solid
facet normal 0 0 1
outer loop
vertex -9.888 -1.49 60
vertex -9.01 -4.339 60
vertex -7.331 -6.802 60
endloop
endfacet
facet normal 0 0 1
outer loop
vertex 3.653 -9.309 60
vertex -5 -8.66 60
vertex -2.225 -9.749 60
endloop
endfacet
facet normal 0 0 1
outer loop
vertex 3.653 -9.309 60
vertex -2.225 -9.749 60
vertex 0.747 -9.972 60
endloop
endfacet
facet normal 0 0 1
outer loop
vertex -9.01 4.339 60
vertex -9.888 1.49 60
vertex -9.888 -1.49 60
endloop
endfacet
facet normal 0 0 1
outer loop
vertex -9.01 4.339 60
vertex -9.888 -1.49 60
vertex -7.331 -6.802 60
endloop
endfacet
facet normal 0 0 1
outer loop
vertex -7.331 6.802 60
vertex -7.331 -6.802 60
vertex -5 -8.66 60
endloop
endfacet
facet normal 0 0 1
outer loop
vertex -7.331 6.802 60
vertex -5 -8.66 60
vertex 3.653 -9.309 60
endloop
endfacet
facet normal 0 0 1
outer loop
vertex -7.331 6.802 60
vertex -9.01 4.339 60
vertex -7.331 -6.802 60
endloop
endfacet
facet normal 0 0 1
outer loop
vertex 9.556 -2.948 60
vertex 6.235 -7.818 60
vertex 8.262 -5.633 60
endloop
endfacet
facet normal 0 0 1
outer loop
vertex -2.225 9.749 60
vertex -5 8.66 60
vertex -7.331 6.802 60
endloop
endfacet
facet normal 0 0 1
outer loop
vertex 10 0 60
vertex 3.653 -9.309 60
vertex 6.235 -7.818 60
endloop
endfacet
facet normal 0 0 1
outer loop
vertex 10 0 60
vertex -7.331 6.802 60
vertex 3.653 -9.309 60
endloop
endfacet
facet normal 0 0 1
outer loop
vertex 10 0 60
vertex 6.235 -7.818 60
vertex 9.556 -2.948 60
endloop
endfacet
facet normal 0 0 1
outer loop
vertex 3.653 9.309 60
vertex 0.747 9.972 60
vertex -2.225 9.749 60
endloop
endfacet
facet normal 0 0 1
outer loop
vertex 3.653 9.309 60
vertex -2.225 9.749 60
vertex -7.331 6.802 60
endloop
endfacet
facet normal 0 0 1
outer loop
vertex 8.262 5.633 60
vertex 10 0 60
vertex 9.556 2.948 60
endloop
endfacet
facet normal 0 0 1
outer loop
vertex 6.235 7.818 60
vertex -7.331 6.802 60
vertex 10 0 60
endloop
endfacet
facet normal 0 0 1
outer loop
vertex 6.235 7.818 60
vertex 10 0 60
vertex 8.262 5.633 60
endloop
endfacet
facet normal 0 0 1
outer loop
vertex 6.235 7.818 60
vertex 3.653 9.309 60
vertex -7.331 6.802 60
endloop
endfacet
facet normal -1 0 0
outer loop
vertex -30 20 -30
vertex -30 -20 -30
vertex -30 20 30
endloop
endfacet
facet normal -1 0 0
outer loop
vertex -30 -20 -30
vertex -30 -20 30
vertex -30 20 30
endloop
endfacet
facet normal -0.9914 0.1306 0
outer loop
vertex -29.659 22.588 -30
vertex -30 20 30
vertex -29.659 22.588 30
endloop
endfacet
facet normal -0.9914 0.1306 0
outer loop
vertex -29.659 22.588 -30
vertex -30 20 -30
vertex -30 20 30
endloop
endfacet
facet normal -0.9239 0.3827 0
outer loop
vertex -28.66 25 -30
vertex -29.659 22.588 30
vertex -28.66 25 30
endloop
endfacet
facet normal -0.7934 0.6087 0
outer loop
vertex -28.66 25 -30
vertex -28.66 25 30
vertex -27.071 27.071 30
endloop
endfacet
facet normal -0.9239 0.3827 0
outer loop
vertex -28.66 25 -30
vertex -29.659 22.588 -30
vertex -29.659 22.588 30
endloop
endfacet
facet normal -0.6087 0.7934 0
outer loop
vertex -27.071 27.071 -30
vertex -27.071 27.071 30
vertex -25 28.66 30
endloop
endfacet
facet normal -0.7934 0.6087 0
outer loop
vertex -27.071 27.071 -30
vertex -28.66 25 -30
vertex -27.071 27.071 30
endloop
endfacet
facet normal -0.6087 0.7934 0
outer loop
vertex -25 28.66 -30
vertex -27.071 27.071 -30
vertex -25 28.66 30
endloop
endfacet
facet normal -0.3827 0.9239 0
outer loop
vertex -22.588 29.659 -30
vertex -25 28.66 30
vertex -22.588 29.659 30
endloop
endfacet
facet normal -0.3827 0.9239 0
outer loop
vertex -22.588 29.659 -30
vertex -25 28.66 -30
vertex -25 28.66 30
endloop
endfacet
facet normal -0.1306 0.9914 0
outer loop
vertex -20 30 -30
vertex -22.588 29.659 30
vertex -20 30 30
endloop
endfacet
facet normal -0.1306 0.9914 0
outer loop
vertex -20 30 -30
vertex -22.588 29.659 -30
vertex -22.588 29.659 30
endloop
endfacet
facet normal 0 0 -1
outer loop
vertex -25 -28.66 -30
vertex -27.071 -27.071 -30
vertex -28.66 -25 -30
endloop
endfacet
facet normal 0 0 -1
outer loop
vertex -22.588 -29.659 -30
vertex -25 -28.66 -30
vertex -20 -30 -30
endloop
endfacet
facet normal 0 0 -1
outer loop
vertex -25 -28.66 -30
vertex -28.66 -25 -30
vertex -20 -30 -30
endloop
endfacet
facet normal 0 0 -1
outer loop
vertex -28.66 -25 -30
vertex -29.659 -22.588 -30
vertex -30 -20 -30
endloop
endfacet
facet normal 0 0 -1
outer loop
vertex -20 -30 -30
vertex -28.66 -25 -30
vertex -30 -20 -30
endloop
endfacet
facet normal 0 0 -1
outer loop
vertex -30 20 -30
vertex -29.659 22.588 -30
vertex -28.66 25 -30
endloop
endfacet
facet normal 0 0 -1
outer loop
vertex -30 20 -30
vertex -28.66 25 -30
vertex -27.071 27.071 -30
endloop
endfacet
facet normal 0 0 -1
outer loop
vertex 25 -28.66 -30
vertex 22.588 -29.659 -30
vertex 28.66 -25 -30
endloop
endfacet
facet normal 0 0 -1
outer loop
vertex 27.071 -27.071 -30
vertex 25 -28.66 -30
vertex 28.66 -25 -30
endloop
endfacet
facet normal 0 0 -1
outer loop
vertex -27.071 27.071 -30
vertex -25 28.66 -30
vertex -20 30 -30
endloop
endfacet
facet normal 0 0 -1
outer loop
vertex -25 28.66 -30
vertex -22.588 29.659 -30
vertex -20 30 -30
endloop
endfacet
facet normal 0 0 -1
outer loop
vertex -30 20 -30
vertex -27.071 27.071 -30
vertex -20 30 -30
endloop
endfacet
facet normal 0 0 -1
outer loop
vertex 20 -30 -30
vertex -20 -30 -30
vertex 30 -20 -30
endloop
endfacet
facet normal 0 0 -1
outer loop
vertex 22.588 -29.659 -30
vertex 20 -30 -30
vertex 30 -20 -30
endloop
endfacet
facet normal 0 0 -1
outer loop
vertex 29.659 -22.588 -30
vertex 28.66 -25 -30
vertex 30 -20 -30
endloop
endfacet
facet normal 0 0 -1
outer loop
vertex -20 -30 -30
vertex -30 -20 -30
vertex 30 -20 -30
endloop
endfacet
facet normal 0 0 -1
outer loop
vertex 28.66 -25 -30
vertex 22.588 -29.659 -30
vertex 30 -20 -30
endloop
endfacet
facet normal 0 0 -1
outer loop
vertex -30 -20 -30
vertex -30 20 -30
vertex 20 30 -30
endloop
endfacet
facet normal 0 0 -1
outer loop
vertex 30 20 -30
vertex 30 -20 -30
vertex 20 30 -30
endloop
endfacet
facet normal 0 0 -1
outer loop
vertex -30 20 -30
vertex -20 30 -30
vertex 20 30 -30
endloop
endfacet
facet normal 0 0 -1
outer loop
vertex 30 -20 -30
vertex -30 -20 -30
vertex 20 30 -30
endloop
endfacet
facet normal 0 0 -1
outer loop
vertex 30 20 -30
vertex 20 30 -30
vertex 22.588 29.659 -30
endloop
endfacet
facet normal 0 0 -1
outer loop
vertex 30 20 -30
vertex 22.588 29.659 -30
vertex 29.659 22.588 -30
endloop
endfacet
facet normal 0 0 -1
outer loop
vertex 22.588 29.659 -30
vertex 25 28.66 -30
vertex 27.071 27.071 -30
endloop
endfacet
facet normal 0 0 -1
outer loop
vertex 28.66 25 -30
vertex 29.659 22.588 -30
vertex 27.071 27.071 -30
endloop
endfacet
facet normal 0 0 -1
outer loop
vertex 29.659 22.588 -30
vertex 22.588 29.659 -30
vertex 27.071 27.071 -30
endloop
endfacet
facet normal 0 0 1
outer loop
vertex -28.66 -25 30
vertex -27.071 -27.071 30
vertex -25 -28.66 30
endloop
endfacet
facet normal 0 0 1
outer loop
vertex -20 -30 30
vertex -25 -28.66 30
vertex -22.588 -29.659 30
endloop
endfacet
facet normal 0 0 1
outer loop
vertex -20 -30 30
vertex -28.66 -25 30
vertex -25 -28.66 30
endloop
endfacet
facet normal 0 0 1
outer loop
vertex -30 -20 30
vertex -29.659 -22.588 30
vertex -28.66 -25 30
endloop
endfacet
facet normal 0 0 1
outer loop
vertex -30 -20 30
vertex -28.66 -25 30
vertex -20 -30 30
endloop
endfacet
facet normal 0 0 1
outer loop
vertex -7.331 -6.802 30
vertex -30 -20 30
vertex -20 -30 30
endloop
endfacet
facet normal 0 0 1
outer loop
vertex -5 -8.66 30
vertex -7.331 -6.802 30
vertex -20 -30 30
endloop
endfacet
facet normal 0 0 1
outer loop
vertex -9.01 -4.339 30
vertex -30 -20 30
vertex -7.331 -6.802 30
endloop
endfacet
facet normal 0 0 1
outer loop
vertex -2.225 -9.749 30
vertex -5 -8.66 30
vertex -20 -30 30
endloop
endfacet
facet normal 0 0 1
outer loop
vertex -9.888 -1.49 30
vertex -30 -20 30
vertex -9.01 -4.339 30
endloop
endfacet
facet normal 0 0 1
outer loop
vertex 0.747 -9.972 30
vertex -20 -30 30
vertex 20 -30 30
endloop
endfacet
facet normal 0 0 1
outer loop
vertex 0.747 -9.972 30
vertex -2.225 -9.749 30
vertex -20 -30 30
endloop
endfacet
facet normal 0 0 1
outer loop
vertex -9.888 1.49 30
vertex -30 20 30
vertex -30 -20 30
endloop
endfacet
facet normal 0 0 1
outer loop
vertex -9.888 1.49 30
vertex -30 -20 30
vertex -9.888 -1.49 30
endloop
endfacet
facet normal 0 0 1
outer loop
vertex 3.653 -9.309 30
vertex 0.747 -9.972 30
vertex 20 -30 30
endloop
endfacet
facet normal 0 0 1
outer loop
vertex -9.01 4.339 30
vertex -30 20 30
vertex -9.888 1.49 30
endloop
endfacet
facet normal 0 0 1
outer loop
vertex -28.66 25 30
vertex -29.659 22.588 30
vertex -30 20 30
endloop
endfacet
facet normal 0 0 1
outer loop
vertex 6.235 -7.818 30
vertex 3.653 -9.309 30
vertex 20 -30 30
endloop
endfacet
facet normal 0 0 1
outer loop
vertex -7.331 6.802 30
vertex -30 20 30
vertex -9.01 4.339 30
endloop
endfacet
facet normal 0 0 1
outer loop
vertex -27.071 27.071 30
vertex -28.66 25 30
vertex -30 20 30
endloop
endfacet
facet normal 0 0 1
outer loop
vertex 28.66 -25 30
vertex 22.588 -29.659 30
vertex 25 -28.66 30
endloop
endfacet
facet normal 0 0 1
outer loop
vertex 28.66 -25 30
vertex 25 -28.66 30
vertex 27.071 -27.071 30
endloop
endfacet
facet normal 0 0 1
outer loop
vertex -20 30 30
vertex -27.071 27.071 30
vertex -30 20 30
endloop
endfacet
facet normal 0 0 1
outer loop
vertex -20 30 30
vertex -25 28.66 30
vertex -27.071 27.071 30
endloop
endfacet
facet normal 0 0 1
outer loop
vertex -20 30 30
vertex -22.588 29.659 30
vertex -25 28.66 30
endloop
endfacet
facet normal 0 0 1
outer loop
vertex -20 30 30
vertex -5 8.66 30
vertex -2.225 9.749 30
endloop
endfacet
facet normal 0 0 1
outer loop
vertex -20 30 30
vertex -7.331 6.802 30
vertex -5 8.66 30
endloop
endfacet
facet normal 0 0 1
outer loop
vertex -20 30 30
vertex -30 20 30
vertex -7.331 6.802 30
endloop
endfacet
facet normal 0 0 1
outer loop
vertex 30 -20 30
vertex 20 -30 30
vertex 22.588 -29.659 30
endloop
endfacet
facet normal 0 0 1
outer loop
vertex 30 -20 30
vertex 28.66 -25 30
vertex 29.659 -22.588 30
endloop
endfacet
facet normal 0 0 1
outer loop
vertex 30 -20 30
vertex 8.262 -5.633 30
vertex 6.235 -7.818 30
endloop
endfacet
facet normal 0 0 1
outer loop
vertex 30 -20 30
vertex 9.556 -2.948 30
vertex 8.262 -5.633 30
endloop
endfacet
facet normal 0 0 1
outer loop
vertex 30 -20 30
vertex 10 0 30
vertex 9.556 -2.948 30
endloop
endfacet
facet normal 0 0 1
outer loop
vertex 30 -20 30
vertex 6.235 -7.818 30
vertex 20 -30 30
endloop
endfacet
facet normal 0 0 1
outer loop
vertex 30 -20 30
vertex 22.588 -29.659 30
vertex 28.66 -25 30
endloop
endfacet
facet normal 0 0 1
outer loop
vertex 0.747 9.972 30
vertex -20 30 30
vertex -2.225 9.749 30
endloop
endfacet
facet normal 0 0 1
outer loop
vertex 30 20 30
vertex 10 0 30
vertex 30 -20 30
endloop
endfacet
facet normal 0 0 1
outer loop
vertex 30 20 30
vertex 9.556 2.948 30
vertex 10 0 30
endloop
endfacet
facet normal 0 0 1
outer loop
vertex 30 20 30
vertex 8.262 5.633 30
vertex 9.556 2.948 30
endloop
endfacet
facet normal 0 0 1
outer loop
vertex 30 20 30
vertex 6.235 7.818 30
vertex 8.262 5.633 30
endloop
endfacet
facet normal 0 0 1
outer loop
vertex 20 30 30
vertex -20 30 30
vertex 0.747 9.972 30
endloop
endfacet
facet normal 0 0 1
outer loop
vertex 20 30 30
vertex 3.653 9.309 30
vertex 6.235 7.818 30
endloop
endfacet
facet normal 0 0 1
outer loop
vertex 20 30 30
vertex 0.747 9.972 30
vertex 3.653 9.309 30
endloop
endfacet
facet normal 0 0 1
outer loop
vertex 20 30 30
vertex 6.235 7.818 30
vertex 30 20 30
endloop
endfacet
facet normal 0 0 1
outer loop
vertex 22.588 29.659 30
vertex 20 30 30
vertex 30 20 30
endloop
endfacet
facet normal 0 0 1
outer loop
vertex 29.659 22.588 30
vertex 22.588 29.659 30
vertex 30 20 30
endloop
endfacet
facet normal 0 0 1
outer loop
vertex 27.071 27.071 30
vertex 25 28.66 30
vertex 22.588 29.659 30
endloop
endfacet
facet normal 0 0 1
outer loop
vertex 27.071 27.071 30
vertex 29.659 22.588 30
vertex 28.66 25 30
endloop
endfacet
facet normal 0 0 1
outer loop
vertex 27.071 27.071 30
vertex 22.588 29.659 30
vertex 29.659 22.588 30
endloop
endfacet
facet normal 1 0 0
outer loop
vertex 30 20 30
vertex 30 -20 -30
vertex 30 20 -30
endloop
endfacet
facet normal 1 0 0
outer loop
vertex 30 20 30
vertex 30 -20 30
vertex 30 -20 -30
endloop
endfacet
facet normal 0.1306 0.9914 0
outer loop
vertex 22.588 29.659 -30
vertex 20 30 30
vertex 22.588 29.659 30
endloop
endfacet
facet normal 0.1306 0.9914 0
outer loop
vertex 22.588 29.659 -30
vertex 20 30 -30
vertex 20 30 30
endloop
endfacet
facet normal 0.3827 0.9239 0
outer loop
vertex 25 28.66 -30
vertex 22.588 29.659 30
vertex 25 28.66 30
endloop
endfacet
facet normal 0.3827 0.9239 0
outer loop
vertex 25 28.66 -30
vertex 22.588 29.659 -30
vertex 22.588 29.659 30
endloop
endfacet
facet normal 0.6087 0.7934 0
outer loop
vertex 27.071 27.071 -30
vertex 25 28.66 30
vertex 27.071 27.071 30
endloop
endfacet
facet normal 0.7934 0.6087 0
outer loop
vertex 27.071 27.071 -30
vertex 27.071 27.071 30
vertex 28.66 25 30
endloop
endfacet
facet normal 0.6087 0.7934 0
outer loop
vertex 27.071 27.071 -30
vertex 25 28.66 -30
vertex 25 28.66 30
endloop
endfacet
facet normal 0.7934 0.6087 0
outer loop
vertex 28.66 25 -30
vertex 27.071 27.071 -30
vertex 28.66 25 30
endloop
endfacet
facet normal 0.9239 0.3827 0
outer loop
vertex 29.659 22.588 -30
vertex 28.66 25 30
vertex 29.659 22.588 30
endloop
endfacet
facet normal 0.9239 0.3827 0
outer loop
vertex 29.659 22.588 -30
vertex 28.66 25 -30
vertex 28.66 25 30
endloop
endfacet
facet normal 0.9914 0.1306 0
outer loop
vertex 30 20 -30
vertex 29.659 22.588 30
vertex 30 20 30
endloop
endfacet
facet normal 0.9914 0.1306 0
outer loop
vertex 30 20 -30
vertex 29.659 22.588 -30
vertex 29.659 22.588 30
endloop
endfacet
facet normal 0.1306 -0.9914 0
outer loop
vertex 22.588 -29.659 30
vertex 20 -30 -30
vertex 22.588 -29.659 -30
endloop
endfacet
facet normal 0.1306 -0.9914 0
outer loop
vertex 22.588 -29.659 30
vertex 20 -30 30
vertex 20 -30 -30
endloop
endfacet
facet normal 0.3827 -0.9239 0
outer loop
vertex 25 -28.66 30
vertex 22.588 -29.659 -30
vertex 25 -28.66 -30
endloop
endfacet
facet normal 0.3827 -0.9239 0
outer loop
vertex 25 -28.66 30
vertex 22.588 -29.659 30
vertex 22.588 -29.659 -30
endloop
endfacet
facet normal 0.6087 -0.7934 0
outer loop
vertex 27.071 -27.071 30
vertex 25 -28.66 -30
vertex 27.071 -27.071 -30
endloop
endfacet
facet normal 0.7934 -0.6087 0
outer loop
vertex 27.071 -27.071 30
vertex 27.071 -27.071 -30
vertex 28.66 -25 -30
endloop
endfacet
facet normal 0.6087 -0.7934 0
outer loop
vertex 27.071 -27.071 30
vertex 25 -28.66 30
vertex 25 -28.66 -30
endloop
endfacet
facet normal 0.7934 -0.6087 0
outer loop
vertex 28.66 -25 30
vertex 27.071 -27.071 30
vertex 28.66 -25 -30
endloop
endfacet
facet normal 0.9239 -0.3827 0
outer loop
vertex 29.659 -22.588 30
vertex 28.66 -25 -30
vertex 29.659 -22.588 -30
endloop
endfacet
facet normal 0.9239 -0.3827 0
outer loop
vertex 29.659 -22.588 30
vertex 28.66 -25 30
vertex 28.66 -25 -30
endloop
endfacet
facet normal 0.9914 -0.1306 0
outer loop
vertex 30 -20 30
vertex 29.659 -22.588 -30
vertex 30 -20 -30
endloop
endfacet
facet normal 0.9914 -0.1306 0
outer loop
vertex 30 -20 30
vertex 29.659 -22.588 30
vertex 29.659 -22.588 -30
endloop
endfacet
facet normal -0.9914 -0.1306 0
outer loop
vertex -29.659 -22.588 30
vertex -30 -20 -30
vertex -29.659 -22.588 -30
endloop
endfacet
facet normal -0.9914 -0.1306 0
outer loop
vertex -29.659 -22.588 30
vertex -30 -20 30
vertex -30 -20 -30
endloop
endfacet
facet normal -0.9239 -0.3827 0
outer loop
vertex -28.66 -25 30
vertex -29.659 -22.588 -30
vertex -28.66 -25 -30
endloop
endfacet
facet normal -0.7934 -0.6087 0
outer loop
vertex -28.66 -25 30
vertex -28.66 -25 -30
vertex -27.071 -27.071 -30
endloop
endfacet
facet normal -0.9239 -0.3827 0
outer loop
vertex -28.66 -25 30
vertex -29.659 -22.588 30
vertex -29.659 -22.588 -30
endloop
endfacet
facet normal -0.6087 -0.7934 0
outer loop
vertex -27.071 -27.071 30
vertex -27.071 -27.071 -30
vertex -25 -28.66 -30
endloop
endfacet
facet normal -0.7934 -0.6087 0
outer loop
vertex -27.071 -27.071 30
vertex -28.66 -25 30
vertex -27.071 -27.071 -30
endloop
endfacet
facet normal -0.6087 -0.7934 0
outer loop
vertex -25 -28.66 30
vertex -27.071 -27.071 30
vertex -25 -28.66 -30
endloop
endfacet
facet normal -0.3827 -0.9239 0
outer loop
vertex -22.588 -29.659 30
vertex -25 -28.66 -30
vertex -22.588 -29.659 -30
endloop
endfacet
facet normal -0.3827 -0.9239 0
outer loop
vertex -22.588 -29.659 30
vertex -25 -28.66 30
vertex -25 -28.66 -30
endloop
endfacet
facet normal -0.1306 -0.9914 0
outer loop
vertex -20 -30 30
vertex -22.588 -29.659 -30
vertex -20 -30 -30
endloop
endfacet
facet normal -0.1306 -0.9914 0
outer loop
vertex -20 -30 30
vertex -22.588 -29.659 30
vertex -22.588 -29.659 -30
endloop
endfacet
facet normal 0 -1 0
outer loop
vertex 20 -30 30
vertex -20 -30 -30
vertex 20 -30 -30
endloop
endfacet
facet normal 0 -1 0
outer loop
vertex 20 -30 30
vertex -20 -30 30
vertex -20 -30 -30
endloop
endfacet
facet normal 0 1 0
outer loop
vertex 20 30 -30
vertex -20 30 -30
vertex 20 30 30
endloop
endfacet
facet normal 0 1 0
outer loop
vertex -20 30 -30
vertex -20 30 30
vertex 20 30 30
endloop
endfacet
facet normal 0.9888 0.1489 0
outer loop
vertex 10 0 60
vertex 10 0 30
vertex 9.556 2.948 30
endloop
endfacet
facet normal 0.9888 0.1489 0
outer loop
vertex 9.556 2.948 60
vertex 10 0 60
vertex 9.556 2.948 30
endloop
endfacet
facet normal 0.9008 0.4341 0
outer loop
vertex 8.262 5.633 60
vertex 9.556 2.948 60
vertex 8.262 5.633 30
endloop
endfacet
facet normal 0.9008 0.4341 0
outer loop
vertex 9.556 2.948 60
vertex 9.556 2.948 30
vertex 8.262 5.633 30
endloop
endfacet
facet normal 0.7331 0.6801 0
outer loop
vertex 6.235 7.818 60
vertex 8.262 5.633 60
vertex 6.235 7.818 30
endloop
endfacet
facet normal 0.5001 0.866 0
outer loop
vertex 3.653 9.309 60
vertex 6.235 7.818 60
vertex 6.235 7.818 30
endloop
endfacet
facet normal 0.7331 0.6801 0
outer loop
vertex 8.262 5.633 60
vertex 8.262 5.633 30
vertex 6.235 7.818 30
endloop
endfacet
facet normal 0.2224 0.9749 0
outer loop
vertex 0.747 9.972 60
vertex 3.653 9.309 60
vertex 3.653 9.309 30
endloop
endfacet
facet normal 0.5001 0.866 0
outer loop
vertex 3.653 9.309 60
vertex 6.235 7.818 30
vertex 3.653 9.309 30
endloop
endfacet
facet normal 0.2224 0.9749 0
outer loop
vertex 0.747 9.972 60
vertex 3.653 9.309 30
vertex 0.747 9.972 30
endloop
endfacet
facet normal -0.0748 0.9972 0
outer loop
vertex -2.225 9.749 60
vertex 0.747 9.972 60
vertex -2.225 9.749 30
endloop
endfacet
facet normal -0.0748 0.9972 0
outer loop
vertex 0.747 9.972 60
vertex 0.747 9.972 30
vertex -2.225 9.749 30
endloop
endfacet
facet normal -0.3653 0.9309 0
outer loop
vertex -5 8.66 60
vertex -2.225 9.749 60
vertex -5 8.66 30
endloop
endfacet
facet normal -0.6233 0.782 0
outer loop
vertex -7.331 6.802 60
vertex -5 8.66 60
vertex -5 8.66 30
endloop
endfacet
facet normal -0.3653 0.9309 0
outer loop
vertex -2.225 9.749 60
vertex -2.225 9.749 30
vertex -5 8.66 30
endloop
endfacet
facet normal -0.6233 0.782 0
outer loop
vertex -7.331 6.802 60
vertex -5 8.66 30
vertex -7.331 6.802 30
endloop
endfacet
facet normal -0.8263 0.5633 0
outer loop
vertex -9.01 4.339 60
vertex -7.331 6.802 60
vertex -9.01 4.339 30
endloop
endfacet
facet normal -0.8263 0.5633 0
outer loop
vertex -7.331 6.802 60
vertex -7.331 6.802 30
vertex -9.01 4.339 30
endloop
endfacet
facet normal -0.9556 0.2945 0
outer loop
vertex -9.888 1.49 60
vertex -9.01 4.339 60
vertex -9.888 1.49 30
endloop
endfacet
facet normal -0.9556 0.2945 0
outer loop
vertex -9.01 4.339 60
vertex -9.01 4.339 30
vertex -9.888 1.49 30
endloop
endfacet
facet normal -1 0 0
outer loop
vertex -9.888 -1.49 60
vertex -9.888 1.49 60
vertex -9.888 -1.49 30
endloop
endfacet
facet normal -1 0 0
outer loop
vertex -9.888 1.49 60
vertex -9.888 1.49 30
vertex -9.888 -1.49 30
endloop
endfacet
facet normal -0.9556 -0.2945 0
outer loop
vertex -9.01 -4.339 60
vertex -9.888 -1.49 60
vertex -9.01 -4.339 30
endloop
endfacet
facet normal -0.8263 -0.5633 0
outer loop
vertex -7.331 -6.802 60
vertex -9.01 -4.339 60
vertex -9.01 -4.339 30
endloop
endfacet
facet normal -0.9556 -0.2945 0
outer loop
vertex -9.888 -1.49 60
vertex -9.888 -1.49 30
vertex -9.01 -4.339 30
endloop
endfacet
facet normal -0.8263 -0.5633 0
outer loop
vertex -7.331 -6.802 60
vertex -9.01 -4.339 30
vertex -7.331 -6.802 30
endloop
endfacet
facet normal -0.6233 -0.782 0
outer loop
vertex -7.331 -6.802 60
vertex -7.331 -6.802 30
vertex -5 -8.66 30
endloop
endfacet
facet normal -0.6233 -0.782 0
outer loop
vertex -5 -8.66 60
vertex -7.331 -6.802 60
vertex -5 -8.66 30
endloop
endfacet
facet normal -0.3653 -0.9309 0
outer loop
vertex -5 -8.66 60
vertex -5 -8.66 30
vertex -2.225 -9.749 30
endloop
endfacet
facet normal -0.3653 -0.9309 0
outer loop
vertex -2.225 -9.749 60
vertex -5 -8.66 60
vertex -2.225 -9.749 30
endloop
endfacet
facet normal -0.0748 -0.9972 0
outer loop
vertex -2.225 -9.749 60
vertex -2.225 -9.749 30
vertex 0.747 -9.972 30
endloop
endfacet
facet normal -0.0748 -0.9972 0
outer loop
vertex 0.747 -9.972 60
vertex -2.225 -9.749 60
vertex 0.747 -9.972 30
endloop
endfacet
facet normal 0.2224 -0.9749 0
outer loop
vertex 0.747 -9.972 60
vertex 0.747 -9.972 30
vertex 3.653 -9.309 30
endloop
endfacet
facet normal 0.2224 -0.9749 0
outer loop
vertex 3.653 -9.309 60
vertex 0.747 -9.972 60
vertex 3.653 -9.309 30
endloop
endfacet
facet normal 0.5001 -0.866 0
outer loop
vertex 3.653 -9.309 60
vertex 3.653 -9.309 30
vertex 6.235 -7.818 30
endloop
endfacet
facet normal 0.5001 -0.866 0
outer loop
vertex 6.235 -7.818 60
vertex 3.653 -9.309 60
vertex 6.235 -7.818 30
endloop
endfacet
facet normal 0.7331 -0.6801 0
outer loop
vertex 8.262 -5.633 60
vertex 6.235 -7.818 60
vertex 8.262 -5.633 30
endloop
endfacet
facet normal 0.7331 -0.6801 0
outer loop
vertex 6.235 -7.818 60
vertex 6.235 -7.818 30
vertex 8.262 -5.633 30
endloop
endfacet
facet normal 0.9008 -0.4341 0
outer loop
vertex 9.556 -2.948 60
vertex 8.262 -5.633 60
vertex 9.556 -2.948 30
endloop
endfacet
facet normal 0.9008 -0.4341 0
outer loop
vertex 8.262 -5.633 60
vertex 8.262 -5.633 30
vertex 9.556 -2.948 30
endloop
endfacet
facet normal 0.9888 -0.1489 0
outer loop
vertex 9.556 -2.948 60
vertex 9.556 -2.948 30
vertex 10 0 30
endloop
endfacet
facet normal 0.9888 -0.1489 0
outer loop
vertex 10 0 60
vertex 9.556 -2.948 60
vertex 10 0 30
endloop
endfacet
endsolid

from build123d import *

# Parameters (mm, degrees)
SKETCH1_W           = 60
SKETCH1_H           = 60
BOSS_EXTRUDE1_DEPTH = 30
SKETCH2_R           = 10
BOSS_EXTRUDE2_DEPTH = 30
FILLET1_R           = 10


with BuildPart() as part:
    # Sketch1 → Boss-Extrude1 (new body, symmetric)
    with BuildSketch(Plane.XY):
        Rectangle(SKETCH1_W, SKETCH1_H)
    extrude(amount=BOSS_EXTRUDE1_DEPTH, both=True)

    # Sketch2 → Boss-Extrude2 (add)
    with BuildSketch(Plane.XY.offset(30)):
        Circle(SKETCH2_R)
    extrude(amount=BOSS_EXTRUDE2_DEPTH)

    # Fillet1
    fillet1_edges = [part.edges().sort_by_distance(p)[0] for p in [
        (30, -30, 0),
        (-30, -30, 0),
        (-30, 30, 0),
        (30, 30, 0),
    ]]
    fillet(fillet1_edges, radius=FILLET1_R)


solid = part.part
